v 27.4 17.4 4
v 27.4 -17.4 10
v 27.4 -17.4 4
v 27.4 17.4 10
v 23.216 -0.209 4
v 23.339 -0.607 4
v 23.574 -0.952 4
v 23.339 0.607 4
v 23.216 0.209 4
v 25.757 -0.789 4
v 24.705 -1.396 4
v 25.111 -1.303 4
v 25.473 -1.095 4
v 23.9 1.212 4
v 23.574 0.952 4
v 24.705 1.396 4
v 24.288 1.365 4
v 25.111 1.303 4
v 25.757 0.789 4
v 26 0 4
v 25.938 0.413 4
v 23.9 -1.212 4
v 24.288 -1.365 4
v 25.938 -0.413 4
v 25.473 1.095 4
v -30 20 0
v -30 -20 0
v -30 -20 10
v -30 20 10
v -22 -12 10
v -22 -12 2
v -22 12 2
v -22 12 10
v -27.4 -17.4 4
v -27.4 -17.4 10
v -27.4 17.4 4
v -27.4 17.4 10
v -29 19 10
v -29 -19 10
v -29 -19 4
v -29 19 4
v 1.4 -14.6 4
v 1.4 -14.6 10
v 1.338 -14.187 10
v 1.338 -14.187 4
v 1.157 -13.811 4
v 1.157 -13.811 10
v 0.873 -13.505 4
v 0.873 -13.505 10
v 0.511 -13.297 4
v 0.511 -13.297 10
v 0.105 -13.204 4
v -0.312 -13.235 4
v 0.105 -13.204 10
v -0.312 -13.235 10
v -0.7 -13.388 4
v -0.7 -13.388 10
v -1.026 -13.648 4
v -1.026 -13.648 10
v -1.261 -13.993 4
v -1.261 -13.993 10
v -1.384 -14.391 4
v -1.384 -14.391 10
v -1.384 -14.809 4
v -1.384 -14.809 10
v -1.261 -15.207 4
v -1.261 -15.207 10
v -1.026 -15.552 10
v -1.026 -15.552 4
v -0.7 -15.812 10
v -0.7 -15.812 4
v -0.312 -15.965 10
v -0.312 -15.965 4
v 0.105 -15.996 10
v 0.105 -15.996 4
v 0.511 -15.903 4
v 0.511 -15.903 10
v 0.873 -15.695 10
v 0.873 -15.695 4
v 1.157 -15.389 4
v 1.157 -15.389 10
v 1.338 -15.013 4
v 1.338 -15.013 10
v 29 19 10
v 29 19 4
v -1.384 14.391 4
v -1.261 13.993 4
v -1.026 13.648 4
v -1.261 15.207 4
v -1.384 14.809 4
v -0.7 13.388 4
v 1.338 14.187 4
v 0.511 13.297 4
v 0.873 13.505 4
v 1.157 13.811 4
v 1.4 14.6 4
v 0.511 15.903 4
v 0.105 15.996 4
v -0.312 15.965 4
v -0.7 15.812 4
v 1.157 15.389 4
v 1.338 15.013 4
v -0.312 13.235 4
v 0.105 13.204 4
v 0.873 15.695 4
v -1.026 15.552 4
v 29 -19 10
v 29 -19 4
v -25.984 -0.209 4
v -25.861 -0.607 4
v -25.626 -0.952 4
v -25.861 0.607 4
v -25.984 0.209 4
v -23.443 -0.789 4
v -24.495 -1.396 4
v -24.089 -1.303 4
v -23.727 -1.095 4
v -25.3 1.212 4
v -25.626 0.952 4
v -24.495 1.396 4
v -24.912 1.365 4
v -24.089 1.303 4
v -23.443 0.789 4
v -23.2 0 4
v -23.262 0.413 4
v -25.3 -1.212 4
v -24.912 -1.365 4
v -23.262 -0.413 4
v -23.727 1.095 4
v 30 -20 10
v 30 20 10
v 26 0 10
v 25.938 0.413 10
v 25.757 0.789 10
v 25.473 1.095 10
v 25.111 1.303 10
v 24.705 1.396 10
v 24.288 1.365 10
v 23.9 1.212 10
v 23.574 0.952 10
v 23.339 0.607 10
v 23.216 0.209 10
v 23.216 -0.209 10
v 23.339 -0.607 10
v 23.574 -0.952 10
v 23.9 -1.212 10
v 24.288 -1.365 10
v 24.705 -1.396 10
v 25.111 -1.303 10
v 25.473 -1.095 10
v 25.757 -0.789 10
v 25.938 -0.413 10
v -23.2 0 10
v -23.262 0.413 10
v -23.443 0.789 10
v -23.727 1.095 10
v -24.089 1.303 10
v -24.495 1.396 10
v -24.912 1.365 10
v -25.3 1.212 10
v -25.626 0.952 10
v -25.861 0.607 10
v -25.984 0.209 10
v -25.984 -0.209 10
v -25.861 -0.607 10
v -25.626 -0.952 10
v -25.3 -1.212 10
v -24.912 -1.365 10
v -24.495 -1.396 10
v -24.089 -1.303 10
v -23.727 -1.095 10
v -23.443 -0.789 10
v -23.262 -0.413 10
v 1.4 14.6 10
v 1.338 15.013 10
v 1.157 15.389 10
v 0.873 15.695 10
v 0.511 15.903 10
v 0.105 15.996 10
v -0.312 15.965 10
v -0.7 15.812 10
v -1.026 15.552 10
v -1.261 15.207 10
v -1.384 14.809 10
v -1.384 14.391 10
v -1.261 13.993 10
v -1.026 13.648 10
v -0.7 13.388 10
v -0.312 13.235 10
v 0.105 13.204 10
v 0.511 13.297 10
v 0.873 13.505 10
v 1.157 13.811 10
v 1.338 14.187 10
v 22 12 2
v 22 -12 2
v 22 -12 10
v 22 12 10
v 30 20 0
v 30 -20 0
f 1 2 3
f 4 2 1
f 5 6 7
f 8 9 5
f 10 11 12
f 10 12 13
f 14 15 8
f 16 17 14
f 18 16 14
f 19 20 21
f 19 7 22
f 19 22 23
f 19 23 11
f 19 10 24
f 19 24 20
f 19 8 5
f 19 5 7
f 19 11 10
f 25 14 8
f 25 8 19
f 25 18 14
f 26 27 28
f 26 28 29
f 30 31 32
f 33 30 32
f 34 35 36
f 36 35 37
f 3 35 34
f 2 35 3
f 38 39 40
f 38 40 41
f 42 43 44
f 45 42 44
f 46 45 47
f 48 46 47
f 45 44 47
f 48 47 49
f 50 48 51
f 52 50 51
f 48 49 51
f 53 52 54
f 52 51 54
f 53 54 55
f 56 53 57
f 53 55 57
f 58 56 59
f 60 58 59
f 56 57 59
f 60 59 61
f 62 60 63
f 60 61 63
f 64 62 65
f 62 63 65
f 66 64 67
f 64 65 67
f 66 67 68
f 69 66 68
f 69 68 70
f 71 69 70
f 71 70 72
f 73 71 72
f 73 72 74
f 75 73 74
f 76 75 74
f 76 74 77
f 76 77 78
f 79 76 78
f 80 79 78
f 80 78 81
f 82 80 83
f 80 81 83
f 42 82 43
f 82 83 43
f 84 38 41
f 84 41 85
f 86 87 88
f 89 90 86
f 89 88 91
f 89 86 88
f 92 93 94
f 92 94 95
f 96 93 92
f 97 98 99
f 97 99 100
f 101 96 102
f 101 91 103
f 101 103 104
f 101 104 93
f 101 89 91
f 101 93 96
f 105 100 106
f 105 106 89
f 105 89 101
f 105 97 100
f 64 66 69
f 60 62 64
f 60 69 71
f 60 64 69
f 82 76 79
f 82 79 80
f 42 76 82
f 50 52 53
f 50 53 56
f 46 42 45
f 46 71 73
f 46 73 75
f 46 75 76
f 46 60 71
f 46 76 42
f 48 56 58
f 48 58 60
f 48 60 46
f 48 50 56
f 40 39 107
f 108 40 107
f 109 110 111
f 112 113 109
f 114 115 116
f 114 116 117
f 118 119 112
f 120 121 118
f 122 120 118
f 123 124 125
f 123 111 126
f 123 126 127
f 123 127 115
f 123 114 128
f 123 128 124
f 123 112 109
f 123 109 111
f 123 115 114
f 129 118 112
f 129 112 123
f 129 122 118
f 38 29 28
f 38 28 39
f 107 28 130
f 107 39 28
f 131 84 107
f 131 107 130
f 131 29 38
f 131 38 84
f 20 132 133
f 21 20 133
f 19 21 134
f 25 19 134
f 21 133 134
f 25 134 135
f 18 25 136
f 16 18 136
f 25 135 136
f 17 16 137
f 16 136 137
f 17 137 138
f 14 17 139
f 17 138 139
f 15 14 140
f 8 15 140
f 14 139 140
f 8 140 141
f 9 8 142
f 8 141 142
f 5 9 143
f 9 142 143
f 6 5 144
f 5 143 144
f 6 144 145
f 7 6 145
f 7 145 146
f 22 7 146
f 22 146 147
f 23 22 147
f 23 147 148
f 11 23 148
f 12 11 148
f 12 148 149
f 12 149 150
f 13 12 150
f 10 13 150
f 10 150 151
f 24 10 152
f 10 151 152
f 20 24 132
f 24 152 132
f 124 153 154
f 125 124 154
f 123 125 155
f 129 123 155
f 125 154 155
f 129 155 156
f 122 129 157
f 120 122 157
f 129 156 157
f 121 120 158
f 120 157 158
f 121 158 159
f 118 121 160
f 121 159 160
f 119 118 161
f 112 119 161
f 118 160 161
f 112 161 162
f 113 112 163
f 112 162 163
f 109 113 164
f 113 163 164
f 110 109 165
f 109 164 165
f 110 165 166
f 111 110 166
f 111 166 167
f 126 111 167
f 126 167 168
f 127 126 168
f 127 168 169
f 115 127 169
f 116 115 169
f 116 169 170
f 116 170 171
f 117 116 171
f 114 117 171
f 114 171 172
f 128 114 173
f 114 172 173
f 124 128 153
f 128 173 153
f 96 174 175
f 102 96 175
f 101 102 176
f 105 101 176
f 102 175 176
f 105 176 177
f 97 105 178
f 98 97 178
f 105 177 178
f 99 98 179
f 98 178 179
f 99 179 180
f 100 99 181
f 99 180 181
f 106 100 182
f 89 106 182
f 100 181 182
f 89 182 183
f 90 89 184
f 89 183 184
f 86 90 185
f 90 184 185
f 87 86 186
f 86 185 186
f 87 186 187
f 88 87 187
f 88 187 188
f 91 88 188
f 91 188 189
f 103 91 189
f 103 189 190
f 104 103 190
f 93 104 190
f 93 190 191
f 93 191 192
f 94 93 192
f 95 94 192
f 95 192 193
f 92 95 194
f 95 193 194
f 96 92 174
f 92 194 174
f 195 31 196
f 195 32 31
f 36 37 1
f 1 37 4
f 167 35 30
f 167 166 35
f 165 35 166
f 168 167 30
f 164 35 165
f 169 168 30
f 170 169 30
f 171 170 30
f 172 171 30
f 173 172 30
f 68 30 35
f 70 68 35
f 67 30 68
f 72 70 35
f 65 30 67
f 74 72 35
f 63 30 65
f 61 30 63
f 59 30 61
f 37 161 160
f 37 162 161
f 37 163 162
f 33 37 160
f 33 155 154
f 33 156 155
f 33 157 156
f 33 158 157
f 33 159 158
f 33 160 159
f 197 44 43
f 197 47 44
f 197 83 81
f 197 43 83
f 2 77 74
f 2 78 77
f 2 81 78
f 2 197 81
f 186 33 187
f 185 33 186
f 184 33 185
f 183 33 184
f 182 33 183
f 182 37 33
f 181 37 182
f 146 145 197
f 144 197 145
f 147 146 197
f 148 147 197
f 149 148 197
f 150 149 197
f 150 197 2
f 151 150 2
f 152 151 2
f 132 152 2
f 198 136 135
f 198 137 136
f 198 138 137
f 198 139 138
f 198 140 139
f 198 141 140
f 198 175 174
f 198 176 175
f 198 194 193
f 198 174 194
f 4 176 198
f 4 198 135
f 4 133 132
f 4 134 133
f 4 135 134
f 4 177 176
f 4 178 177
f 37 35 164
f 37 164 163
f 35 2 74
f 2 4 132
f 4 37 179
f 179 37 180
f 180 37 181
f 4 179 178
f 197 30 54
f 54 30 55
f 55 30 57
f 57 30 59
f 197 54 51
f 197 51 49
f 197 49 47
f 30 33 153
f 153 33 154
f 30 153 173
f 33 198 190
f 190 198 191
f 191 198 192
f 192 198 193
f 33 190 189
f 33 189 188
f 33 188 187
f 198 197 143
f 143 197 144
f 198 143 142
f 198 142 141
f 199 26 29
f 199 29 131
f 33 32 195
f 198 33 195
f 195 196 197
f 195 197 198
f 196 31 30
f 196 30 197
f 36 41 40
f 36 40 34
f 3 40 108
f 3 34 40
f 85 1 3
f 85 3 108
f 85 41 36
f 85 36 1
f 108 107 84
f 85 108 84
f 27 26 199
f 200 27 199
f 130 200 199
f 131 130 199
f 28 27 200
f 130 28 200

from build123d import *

# Parameters (mm, degrees)
SKETCH_W      = 60
SKETCH_H      = 40
PAD_DEPTH     = 2
SKETCH001_W   = 60
SKETCH001_H   = 40
SKETCH001_W_2 = 44
SKETCH001_H_2 = 24
PAD001_DEPTH  = 10
SKETCH002_W   = 58
SKETCH002_H   = 38
SKETCH002_W_2 = 54.8
SKETCH002_H_2 = 34.8
SKETCH002_R   = 1.4
POCKET_DEPTH  = 6


with BuildPart() as part:
    # Sketch → Pad (new body)
    with BuildSketch(Plane.XY):
        Rectangle(SKETCH_W, SKETCH_H)
    extrude(amount=PAD_DEPTH)

    # Sketch001 → Pad001 (join)
    with BuildSketch(Plane.XY):
        Rectangle(SKETCH001_W, SKETCH001_H)
        Rectangle(SKETCH001_W_2, SKETCH001_H_2, mode=Mode.SUBTRACT)
    extrude(amount=PAD001_DEPTH)

    # Sketch002 (on Face10 of Pad001) → Pocket (cut)
    with BuildSketch(Plane.XY.offset(10)):
        Rectangle(SKETCH002_W, SKETCH002_H)
        Rectangle(SKETCH002_W_2, SKETCH002_H_2, mode=Mode.SUBTRACT)
        with Locations((0, 14.6)):
            Circle(SKETCH002_R)
        with Locations((24.6, 0)):
            Circle(SKETCH002_R)
        with Locations((0, -14.6)):
            Circle(SKETCH002_R)
        with Locations((-24.6, 0)):
            Circle(SKETCH002_R)
    extrude(amount=-POCKET_DEPTH, mode=Mode.SUBTRACT)


solid = part.part
